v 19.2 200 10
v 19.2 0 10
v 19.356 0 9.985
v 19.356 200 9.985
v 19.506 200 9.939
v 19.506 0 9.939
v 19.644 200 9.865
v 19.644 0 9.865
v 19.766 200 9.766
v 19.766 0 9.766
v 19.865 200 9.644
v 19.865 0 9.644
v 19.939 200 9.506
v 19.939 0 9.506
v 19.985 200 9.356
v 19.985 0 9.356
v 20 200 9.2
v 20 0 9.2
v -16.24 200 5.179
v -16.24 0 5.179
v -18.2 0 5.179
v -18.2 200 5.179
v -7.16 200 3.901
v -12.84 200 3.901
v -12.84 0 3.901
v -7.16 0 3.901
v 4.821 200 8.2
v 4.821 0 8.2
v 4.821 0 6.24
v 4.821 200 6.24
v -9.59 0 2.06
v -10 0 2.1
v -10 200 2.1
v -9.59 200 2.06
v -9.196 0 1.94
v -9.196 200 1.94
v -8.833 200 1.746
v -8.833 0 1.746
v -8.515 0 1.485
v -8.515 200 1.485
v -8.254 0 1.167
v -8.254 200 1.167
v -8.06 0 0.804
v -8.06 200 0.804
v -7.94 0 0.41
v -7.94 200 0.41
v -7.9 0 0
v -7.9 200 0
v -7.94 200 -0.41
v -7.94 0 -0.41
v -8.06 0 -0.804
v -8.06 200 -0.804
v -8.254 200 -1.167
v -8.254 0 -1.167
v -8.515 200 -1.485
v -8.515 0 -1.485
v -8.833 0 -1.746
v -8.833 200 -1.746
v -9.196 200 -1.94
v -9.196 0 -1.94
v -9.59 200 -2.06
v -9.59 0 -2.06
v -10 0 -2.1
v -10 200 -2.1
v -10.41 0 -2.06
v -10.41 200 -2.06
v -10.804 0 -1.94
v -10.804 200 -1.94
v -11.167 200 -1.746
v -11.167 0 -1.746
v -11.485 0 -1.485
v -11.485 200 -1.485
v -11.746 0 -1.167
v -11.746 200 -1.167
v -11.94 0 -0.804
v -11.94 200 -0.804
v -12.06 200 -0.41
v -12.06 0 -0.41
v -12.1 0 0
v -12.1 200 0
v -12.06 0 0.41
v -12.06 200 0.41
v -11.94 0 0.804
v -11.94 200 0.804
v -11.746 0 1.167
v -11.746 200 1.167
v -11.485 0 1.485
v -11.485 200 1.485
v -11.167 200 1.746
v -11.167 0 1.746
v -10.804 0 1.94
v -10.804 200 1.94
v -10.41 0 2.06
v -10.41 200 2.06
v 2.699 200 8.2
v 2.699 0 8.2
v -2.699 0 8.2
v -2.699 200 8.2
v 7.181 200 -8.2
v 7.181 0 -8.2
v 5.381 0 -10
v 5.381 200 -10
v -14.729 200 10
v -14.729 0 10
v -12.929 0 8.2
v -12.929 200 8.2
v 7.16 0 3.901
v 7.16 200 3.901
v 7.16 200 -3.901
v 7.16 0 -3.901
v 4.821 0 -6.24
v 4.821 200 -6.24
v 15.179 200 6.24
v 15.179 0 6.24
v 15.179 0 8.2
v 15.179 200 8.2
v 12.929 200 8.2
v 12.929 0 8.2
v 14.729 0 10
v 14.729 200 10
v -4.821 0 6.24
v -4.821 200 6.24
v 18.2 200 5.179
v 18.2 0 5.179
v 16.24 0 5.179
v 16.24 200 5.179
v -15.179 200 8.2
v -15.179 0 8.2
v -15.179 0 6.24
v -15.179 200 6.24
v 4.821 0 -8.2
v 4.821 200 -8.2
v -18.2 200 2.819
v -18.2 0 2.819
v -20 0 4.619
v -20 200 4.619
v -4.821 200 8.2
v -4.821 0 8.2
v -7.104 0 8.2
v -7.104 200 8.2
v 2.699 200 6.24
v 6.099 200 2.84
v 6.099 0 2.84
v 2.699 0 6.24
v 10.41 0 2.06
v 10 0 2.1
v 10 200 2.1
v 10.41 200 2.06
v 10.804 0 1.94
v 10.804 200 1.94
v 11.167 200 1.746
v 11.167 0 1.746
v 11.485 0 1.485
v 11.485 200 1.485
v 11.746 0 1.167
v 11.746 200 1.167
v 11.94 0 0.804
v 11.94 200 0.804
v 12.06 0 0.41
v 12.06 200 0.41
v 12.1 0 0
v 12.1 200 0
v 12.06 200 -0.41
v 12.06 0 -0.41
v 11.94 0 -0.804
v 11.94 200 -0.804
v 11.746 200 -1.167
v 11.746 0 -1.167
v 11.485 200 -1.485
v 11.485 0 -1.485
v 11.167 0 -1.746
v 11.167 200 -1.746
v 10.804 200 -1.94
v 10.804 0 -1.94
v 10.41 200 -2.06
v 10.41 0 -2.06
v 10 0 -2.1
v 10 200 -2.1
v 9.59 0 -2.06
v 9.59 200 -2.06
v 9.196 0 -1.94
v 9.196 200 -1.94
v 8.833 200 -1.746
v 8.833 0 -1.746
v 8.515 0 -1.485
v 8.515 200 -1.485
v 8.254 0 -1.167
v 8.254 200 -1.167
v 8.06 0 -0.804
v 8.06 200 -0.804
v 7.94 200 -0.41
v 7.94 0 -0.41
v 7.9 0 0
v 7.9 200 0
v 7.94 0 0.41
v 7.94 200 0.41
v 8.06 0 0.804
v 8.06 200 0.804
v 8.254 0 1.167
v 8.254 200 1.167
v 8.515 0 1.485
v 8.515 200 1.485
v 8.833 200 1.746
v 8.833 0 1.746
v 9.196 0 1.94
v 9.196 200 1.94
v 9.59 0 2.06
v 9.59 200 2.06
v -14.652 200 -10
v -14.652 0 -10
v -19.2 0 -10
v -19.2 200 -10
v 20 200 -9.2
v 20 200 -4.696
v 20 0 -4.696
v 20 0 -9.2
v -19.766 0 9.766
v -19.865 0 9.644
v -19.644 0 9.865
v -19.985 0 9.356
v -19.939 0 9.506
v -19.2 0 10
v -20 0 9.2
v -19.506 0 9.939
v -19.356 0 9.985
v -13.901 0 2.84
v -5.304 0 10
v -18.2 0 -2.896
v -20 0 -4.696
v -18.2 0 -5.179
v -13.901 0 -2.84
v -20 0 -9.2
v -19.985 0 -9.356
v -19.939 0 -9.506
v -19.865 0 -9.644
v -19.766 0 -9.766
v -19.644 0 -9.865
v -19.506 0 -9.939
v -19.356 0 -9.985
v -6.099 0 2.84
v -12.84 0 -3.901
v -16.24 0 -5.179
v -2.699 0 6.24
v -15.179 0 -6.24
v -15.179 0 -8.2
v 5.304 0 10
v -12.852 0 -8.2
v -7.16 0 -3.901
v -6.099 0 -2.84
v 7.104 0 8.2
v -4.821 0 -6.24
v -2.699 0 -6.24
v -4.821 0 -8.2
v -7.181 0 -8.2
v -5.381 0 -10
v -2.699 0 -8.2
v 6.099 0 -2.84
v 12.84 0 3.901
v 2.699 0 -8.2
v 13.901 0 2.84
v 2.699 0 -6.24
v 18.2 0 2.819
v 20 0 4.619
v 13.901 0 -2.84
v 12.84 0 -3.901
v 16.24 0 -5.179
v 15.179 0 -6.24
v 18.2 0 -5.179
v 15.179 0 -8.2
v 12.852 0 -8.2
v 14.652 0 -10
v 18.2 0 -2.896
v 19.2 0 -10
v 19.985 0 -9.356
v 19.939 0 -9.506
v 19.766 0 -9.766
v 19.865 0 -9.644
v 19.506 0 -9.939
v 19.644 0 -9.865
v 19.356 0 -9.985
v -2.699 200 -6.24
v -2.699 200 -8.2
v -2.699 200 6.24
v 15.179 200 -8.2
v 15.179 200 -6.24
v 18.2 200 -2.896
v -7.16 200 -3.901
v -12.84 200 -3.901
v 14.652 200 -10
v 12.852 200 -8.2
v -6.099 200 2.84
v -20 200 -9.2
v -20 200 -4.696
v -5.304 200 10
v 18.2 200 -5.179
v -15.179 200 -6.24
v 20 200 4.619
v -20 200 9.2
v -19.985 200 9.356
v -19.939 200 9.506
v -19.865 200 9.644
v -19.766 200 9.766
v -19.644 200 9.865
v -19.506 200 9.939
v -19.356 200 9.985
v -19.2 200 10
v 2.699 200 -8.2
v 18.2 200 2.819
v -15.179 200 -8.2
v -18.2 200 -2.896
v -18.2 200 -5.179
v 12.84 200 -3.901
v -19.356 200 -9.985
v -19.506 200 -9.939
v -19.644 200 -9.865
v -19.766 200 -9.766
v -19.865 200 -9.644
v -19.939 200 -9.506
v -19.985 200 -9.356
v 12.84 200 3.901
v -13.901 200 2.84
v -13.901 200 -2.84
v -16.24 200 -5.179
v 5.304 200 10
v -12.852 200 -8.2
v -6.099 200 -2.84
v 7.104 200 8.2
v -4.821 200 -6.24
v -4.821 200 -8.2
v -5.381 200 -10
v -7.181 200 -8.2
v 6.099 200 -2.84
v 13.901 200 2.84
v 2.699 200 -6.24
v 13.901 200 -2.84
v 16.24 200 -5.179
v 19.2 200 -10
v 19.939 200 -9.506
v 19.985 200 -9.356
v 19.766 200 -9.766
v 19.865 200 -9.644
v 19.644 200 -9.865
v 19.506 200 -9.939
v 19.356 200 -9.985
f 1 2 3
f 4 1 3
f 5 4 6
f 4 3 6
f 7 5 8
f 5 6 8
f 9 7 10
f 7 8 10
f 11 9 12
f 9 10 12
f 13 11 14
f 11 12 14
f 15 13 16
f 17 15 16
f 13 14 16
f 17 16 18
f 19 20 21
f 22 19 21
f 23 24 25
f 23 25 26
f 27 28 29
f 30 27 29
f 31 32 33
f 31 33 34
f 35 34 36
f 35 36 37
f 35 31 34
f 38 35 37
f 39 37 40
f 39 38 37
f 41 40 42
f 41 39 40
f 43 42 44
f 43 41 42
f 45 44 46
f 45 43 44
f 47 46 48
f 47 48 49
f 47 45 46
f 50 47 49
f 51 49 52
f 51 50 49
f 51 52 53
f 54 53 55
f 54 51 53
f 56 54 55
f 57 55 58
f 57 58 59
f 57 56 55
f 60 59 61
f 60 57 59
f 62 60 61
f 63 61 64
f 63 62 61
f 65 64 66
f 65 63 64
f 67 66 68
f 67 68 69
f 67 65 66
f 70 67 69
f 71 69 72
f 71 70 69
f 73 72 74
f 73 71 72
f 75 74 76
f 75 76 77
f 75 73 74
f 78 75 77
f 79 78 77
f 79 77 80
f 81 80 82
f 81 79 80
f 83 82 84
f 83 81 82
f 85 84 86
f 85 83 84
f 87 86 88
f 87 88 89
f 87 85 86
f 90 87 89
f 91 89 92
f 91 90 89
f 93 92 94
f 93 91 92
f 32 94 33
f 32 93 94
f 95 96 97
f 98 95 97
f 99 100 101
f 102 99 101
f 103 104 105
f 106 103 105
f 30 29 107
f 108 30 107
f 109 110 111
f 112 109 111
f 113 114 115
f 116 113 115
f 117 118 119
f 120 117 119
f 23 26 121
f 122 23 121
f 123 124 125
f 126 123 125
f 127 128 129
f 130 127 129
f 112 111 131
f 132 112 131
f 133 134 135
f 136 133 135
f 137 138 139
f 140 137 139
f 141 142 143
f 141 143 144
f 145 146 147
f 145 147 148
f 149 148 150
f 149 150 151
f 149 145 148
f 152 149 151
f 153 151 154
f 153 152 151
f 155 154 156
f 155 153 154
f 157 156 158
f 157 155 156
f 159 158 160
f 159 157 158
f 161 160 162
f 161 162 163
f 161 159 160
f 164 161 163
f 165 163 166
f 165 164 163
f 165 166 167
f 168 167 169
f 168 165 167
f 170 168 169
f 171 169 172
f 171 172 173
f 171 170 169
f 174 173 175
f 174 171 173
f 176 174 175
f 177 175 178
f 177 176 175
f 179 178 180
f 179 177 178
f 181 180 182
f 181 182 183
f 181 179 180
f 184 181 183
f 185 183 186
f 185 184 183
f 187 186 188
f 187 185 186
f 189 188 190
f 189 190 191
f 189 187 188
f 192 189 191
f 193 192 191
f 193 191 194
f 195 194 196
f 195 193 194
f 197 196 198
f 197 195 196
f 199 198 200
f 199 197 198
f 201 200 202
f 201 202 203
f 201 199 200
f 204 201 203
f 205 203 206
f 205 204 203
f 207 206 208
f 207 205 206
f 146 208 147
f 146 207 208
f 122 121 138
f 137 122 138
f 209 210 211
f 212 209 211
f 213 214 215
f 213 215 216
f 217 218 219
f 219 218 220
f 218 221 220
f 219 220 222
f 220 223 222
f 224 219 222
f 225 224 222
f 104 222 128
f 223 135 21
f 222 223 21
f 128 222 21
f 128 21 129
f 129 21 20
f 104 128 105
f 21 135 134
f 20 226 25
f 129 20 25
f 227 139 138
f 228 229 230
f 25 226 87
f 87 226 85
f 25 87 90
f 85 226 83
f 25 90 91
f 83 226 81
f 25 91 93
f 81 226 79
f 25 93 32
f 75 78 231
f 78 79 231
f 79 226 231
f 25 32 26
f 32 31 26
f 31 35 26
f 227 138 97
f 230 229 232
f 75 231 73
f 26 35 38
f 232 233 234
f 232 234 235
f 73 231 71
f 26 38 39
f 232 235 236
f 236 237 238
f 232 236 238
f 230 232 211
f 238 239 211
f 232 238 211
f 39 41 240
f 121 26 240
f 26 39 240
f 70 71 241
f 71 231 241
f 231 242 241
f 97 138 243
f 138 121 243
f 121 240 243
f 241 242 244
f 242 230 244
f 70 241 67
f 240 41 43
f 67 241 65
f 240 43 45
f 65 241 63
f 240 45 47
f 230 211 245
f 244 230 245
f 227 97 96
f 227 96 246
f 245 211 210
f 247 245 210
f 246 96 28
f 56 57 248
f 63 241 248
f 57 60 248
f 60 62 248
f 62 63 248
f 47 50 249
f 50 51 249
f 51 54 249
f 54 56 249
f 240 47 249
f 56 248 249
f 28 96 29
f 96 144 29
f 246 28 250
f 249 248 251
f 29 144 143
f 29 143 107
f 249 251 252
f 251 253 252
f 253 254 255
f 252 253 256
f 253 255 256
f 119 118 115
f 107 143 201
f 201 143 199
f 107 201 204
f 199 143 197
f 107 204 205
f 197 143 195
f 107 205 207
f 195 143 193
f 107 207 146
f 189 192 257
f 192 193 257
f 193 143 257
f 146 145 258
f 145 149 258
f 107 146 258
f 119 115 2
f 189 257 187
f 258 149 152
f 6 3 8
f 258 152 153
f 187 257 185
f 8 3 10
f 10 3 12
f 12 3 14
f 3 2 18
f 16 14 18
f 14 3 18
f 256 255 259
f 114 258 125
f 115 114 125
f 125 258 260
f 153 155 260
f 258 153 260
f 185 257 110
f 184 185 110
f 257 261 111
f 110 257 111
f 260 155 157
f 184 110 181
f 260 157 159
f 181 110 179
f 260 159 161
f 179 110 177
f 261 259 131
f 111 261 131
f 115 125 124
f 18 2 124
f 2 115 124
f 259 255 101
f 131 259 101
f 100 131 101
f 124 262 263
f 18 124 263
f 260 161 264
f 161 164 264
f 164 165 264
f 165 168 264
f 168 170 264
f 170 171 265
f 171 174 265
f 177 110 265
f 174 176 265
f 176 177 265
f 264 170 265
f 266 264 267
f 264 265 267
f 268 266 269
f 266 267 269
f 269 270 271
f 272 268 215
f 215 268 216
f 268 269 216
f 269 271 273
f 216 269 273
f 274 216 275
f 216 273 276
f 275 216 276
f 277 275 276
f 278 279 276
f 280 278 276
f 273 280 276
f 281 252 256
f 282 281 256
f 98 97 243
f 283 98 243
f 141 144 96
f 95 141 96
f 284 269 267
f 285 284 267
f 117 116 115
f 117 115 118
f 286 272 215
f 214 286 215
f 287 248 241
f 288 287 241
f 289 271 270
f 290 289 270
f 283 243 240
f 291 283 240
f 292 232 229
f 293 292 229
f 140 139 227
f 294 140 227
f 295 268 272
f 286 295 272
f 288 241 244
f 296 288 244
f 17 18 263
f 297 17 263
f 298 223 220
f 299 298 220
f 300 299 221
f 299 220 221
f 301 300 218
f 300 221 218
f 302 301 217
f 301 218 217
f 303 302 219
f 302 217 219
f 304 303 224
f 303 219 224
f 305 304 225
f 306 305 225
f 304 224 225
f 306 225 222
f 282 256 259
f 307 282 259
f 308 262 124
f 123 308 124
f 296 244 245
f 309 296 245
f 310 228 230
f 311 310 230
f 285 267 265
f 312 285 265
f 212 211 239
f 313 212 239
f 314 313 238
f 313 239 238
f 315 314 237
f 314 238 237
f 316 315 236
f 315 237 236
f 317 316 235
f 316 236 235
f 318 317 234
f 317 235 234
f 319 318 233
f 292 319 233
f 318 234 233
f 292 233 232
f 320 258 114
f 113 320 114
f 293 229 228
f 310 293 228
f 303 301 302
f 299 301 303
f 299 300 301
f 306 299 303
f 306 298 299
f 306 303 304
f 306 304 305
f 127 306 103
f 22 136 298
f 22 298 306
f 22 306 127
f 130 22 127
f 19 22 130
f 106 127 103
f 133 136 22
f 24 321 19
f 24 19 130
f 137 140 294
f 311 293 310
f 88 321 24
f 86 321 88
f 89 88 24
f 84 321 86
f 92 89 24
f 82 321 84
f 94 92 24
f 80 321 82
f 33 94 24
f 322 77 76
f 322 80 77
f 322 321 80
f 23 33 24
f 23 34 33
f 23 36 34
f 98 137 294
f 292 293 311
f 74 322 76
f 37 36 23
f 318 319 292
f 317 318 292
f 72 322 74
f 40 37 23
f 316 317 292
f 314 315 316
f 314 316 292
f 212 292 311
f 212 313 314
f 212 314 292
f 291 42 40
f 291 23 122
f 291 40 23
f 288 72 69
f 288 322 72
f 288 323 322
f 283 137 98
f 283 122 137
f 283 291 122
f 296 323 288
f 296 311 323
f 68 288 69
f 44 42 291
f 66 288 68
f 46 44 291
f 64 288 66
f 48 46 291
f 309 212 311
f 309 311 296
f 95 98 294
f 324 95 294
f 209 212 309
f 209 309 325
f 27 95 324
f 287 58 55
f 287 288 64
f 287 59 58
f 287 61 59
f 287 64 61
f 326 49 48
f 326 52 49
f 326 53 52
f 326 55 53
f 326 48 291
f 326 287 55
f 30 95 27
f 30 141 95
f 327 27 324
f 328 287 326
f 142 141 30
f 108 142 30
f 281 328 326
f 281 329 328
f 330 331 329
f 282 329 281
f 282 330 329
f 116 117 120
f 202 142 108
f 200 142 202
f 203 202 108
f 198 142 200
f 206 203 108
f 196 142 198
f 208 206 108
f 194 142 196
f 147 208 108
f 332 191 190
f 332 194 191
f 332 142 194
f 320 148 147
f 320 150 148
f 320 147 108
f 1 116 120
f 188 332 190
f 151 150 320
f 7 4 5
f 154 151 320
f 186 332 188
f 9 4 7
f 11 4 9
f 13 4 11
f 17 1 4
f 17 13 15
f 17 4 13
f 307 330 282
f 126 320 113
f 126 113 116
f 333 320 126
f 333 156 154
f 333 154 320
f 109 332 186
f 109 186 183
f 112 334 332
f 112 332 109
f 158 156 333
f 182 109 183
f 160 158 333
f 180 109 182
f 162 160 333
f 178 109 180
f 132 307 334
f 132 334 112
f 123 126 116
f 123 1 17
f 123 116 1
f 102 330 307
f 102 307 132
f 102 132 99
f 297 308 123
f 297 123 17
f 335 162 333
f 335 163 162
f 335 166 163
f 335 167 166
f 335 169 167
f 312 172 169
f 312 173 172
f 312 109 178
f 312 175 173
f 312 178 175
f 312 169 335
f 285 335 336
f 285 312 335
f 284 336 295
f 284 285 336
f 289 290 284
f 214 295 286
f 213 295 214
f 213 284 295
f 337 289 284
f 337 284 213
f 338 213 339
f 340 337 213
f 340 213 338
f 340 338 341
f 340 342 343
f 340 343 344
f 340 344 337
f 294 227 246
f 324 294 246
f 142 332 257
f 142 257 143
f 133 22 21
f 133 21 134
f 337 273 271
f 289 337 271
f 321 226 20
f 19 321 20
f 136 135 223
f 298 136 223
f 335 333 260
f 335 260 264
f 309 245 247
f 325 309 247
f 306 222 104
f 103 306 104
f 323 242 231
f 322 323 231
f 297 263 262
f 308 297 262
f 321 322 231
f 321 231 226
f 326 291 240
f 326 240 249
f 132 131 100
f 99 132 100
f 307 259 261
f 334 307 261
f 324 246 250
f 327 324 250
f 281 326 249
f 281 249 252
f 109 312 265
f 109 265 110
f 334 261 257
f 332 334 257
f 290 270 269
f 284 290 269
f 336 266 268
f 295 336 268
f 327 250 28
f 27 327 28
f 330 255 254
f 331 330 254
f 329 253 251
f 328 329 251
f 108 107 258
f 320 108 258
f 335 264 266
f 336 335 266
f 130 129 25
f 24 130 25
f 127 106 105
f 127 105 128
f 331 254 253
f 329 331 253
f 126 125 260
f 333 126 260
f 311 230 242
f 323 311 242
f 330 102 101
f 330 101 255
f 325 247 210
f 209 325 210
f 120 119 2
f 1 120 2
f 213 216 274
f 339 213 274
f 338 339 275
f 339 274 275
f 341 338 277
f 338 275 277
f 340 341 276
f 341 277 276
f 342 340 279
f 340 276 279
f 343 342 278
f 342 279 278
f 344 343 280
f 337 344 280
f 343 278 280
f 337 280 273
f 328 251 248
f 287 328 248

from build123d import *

# Parameters (mm, degrees)
SKETCH3_R               = 2.1
SALIENTE_EXTRUIR1_DEPTH = 200


with BuildPart() as part:
    # Sketch3 → Saliente-Extruir1 (new body)
    with BuildSketch(Plane(origin=(0, 0, 0), x_dir=(1, 0, 0), z_dir=(0, 1, 0))):
        with BuildLine():
            Line((-19.2, -10), (-14.728647189, -10))
            Line((-14.728647189, -10), (-12.928647189, -8.2))
            Line((-12.928647189, -8.2), (-15.179339828, -8.2))
            Line((-15.179339828, -8.2), (-15.179339828, -6.24))
            Line((-15.179339828, -6.24), (-12.84, -3.900660172))
            Line((-12.84, -3.900660172), (-7.16, -3.900660172))
            Line((-7.16, -3.900660172), (-4.820660172, -6.24))
            Line((-4.820660172, -6.24), (-4.820660172, -8.2))
            Line((-4.820660172, -8.2), (-7.104380066, -8.2))
            Line((-7.104380066, -8.2), (-5.304380066, -10))
            Line((-5.304380066, -10), (0, -10))
            Line((0, -10), (5.304380066, -10))
            Line((5.304380066, -10), (7.104380066, -8.2))
            Line((7.104380066, -8.2), (4.820660172, -8.2))
            Line((4.820660172, -8.2), (4.820660172, -6.24))
            Line((4.820660172, -6.24), (7.16, -3.900660172))
            Line((7.16, -3.900660172), (12.84, -3.900660172))
            Line((12.84, -3.900660172), (15.179339828, -6.24))
            Line((15.179339828, -6.24), (15.179339828, -8.2))
            Line((15.179339828, -8.2), (12.928647189, -8.2))
            Line((12.928647189, -8.2), (14.728647189, -10))
            Line((14.728647189, -10), (19.2, -10))
            ThreePointArc((19.2, -10), (19.765685425, -9.765685425), (20, -9.2))
            Line((20, -9.2), (20, -4.619288759))
            Line((20, -4.619288759), (18.2, -2.819288759))
            Line((18.2, -2.819288759), (18.2, -5.179339828))
            Line((18.2, -5.179339828), (16.24, -5.179339828))
            Line((16.24, -5.179339828), (13.900660172, -2.84))
            Line((13.900660172, -2.84), (13.900660172, 2.84))
            Line((13.900660172, 2.84), (16.24, 5.179339828))
            Line((16.24, 5.179339828), (18.2, 5.179339828))
            Line((18.2, 5.179339828), (18.2, 2.895619934))
            Line((18.2, 2.895619934), (20, 4.695619934))
            Line((20, 4.695619934), (20, 9.2))
            ThreePointArc((20, 9.2), (19.765685425, 9.765685425), (19.2, 10))
            Line((19.2, 10), (14.652316014, 10))
            Line((14.652316014, 10), (12.852316014, 8.2))
            Line((12.852316014, 8.2), (15.179339828, 8.2))
            Line((15.179339828, 8.2), (15.179339828, 6.24))
            Line((15.179339828, 6.24), (12.84, 3.900660172))
            Line((12.84, 3.900660172), (7.16, 3.900660172))
            Line((7.16, 3.900660172), (4.820660172, 6.24))
            Line((4.820660172, 6.24), (4.820660172, 8.2))
            Line((4.820660172, 8.2), (7.180711241, 8.2))
            Line((7.180711241, 8.2), (5.380711241, 10))
            Line((5.380711241, 10), (0, 10))
            Line((0, 10), (-5.380711241, 10))
            Line((-5.380711241, 10), (-7.180711241, 8.2))
            Line((-7.180711241, 8.2), (-4.820660172, 8.2))
            Line((-4.820660172, 8.2), (-4.820660172, 6.24))
            Line((-4.820660172, 6.24), (-7.16, 3.900660172))
            Line((-7.16, 3.900660172), (-12.84, 3.900660172))
            Line((-12.84, 3.900660172), (-15.179339828, 6.24))
            Line((-15.179339828, 6.24), (-15.179339828, 8.2))
            Line((-15.179339828, 8.2), (-12.852316014, 8.2))
            Line((-12.852316014, 8.2), (-14.652316014, 10))
            Line((-14.652316014, 10), (-19.2, 10))
            ThreePointArc((-19.2, 10), (-19.765685425, 9.765685425), (-20, 9.2))
            Line((-20, 9.2), (-20, 4.695619934))
            Line((-20, 4.695619934), (-18.2, 2.895619934))
            Line((-18.2, 2.895619934), (-18.2, 5.179339828))
            Line((-18.2, 5.179339828), (-16.24, 5.179339828))
            Line((-16.24, 5.179339828), (-13.900660172, 2.84))
            Line((-13.900660172, 2.84), (-13.900660172, -2.84))
            Line((-13.900660172, -2.84), (-16.24, -5.179339828))
            Line((-16.24, -5.179339828), (-18.2, -5.179339828))
            Line((-18.2, -5.179339828), (-18.2, -2.819288759))
            Line((-18.2, -2.819288759), (-20, -4.619288759))
            Line((-20, -4.619288759), (-20, -9.2))
            ThreePointArc((-20, -9.2), (-19.765685425, -9.765685425), (-19.2, -10))
        make_face()
        with Locations(Location((-10, 0, 0), (0, 0, 270))):
            Circle(SKETCH3_R, mode=Mode.SUBTRACT)
        with Locations(Location((10, 0, 0), (0, 0, 270))):
            Circle(SKETCH3_R, mode=Mode.SUBTRACT)
        Polygon((-2.699339828, -6.24), (-6.099339828, -2.84), (-6.099339828, 2.84), (-2.699339828, 6.24), (-2.699339828, 8.2), (2.699339828, 8.2), (2.699339828, 6.24), (6.099339828, 2.84), (6.099339828, -2.84), (2.699339828, -6.24), (2.699339828, -8.2), (-2.699339828, -8.2), align=None, mode=Mode.SUBTRACT)
    extrude(amount=SALIENTE_EXTRUIR1_DEPTH)


solid = part.part
